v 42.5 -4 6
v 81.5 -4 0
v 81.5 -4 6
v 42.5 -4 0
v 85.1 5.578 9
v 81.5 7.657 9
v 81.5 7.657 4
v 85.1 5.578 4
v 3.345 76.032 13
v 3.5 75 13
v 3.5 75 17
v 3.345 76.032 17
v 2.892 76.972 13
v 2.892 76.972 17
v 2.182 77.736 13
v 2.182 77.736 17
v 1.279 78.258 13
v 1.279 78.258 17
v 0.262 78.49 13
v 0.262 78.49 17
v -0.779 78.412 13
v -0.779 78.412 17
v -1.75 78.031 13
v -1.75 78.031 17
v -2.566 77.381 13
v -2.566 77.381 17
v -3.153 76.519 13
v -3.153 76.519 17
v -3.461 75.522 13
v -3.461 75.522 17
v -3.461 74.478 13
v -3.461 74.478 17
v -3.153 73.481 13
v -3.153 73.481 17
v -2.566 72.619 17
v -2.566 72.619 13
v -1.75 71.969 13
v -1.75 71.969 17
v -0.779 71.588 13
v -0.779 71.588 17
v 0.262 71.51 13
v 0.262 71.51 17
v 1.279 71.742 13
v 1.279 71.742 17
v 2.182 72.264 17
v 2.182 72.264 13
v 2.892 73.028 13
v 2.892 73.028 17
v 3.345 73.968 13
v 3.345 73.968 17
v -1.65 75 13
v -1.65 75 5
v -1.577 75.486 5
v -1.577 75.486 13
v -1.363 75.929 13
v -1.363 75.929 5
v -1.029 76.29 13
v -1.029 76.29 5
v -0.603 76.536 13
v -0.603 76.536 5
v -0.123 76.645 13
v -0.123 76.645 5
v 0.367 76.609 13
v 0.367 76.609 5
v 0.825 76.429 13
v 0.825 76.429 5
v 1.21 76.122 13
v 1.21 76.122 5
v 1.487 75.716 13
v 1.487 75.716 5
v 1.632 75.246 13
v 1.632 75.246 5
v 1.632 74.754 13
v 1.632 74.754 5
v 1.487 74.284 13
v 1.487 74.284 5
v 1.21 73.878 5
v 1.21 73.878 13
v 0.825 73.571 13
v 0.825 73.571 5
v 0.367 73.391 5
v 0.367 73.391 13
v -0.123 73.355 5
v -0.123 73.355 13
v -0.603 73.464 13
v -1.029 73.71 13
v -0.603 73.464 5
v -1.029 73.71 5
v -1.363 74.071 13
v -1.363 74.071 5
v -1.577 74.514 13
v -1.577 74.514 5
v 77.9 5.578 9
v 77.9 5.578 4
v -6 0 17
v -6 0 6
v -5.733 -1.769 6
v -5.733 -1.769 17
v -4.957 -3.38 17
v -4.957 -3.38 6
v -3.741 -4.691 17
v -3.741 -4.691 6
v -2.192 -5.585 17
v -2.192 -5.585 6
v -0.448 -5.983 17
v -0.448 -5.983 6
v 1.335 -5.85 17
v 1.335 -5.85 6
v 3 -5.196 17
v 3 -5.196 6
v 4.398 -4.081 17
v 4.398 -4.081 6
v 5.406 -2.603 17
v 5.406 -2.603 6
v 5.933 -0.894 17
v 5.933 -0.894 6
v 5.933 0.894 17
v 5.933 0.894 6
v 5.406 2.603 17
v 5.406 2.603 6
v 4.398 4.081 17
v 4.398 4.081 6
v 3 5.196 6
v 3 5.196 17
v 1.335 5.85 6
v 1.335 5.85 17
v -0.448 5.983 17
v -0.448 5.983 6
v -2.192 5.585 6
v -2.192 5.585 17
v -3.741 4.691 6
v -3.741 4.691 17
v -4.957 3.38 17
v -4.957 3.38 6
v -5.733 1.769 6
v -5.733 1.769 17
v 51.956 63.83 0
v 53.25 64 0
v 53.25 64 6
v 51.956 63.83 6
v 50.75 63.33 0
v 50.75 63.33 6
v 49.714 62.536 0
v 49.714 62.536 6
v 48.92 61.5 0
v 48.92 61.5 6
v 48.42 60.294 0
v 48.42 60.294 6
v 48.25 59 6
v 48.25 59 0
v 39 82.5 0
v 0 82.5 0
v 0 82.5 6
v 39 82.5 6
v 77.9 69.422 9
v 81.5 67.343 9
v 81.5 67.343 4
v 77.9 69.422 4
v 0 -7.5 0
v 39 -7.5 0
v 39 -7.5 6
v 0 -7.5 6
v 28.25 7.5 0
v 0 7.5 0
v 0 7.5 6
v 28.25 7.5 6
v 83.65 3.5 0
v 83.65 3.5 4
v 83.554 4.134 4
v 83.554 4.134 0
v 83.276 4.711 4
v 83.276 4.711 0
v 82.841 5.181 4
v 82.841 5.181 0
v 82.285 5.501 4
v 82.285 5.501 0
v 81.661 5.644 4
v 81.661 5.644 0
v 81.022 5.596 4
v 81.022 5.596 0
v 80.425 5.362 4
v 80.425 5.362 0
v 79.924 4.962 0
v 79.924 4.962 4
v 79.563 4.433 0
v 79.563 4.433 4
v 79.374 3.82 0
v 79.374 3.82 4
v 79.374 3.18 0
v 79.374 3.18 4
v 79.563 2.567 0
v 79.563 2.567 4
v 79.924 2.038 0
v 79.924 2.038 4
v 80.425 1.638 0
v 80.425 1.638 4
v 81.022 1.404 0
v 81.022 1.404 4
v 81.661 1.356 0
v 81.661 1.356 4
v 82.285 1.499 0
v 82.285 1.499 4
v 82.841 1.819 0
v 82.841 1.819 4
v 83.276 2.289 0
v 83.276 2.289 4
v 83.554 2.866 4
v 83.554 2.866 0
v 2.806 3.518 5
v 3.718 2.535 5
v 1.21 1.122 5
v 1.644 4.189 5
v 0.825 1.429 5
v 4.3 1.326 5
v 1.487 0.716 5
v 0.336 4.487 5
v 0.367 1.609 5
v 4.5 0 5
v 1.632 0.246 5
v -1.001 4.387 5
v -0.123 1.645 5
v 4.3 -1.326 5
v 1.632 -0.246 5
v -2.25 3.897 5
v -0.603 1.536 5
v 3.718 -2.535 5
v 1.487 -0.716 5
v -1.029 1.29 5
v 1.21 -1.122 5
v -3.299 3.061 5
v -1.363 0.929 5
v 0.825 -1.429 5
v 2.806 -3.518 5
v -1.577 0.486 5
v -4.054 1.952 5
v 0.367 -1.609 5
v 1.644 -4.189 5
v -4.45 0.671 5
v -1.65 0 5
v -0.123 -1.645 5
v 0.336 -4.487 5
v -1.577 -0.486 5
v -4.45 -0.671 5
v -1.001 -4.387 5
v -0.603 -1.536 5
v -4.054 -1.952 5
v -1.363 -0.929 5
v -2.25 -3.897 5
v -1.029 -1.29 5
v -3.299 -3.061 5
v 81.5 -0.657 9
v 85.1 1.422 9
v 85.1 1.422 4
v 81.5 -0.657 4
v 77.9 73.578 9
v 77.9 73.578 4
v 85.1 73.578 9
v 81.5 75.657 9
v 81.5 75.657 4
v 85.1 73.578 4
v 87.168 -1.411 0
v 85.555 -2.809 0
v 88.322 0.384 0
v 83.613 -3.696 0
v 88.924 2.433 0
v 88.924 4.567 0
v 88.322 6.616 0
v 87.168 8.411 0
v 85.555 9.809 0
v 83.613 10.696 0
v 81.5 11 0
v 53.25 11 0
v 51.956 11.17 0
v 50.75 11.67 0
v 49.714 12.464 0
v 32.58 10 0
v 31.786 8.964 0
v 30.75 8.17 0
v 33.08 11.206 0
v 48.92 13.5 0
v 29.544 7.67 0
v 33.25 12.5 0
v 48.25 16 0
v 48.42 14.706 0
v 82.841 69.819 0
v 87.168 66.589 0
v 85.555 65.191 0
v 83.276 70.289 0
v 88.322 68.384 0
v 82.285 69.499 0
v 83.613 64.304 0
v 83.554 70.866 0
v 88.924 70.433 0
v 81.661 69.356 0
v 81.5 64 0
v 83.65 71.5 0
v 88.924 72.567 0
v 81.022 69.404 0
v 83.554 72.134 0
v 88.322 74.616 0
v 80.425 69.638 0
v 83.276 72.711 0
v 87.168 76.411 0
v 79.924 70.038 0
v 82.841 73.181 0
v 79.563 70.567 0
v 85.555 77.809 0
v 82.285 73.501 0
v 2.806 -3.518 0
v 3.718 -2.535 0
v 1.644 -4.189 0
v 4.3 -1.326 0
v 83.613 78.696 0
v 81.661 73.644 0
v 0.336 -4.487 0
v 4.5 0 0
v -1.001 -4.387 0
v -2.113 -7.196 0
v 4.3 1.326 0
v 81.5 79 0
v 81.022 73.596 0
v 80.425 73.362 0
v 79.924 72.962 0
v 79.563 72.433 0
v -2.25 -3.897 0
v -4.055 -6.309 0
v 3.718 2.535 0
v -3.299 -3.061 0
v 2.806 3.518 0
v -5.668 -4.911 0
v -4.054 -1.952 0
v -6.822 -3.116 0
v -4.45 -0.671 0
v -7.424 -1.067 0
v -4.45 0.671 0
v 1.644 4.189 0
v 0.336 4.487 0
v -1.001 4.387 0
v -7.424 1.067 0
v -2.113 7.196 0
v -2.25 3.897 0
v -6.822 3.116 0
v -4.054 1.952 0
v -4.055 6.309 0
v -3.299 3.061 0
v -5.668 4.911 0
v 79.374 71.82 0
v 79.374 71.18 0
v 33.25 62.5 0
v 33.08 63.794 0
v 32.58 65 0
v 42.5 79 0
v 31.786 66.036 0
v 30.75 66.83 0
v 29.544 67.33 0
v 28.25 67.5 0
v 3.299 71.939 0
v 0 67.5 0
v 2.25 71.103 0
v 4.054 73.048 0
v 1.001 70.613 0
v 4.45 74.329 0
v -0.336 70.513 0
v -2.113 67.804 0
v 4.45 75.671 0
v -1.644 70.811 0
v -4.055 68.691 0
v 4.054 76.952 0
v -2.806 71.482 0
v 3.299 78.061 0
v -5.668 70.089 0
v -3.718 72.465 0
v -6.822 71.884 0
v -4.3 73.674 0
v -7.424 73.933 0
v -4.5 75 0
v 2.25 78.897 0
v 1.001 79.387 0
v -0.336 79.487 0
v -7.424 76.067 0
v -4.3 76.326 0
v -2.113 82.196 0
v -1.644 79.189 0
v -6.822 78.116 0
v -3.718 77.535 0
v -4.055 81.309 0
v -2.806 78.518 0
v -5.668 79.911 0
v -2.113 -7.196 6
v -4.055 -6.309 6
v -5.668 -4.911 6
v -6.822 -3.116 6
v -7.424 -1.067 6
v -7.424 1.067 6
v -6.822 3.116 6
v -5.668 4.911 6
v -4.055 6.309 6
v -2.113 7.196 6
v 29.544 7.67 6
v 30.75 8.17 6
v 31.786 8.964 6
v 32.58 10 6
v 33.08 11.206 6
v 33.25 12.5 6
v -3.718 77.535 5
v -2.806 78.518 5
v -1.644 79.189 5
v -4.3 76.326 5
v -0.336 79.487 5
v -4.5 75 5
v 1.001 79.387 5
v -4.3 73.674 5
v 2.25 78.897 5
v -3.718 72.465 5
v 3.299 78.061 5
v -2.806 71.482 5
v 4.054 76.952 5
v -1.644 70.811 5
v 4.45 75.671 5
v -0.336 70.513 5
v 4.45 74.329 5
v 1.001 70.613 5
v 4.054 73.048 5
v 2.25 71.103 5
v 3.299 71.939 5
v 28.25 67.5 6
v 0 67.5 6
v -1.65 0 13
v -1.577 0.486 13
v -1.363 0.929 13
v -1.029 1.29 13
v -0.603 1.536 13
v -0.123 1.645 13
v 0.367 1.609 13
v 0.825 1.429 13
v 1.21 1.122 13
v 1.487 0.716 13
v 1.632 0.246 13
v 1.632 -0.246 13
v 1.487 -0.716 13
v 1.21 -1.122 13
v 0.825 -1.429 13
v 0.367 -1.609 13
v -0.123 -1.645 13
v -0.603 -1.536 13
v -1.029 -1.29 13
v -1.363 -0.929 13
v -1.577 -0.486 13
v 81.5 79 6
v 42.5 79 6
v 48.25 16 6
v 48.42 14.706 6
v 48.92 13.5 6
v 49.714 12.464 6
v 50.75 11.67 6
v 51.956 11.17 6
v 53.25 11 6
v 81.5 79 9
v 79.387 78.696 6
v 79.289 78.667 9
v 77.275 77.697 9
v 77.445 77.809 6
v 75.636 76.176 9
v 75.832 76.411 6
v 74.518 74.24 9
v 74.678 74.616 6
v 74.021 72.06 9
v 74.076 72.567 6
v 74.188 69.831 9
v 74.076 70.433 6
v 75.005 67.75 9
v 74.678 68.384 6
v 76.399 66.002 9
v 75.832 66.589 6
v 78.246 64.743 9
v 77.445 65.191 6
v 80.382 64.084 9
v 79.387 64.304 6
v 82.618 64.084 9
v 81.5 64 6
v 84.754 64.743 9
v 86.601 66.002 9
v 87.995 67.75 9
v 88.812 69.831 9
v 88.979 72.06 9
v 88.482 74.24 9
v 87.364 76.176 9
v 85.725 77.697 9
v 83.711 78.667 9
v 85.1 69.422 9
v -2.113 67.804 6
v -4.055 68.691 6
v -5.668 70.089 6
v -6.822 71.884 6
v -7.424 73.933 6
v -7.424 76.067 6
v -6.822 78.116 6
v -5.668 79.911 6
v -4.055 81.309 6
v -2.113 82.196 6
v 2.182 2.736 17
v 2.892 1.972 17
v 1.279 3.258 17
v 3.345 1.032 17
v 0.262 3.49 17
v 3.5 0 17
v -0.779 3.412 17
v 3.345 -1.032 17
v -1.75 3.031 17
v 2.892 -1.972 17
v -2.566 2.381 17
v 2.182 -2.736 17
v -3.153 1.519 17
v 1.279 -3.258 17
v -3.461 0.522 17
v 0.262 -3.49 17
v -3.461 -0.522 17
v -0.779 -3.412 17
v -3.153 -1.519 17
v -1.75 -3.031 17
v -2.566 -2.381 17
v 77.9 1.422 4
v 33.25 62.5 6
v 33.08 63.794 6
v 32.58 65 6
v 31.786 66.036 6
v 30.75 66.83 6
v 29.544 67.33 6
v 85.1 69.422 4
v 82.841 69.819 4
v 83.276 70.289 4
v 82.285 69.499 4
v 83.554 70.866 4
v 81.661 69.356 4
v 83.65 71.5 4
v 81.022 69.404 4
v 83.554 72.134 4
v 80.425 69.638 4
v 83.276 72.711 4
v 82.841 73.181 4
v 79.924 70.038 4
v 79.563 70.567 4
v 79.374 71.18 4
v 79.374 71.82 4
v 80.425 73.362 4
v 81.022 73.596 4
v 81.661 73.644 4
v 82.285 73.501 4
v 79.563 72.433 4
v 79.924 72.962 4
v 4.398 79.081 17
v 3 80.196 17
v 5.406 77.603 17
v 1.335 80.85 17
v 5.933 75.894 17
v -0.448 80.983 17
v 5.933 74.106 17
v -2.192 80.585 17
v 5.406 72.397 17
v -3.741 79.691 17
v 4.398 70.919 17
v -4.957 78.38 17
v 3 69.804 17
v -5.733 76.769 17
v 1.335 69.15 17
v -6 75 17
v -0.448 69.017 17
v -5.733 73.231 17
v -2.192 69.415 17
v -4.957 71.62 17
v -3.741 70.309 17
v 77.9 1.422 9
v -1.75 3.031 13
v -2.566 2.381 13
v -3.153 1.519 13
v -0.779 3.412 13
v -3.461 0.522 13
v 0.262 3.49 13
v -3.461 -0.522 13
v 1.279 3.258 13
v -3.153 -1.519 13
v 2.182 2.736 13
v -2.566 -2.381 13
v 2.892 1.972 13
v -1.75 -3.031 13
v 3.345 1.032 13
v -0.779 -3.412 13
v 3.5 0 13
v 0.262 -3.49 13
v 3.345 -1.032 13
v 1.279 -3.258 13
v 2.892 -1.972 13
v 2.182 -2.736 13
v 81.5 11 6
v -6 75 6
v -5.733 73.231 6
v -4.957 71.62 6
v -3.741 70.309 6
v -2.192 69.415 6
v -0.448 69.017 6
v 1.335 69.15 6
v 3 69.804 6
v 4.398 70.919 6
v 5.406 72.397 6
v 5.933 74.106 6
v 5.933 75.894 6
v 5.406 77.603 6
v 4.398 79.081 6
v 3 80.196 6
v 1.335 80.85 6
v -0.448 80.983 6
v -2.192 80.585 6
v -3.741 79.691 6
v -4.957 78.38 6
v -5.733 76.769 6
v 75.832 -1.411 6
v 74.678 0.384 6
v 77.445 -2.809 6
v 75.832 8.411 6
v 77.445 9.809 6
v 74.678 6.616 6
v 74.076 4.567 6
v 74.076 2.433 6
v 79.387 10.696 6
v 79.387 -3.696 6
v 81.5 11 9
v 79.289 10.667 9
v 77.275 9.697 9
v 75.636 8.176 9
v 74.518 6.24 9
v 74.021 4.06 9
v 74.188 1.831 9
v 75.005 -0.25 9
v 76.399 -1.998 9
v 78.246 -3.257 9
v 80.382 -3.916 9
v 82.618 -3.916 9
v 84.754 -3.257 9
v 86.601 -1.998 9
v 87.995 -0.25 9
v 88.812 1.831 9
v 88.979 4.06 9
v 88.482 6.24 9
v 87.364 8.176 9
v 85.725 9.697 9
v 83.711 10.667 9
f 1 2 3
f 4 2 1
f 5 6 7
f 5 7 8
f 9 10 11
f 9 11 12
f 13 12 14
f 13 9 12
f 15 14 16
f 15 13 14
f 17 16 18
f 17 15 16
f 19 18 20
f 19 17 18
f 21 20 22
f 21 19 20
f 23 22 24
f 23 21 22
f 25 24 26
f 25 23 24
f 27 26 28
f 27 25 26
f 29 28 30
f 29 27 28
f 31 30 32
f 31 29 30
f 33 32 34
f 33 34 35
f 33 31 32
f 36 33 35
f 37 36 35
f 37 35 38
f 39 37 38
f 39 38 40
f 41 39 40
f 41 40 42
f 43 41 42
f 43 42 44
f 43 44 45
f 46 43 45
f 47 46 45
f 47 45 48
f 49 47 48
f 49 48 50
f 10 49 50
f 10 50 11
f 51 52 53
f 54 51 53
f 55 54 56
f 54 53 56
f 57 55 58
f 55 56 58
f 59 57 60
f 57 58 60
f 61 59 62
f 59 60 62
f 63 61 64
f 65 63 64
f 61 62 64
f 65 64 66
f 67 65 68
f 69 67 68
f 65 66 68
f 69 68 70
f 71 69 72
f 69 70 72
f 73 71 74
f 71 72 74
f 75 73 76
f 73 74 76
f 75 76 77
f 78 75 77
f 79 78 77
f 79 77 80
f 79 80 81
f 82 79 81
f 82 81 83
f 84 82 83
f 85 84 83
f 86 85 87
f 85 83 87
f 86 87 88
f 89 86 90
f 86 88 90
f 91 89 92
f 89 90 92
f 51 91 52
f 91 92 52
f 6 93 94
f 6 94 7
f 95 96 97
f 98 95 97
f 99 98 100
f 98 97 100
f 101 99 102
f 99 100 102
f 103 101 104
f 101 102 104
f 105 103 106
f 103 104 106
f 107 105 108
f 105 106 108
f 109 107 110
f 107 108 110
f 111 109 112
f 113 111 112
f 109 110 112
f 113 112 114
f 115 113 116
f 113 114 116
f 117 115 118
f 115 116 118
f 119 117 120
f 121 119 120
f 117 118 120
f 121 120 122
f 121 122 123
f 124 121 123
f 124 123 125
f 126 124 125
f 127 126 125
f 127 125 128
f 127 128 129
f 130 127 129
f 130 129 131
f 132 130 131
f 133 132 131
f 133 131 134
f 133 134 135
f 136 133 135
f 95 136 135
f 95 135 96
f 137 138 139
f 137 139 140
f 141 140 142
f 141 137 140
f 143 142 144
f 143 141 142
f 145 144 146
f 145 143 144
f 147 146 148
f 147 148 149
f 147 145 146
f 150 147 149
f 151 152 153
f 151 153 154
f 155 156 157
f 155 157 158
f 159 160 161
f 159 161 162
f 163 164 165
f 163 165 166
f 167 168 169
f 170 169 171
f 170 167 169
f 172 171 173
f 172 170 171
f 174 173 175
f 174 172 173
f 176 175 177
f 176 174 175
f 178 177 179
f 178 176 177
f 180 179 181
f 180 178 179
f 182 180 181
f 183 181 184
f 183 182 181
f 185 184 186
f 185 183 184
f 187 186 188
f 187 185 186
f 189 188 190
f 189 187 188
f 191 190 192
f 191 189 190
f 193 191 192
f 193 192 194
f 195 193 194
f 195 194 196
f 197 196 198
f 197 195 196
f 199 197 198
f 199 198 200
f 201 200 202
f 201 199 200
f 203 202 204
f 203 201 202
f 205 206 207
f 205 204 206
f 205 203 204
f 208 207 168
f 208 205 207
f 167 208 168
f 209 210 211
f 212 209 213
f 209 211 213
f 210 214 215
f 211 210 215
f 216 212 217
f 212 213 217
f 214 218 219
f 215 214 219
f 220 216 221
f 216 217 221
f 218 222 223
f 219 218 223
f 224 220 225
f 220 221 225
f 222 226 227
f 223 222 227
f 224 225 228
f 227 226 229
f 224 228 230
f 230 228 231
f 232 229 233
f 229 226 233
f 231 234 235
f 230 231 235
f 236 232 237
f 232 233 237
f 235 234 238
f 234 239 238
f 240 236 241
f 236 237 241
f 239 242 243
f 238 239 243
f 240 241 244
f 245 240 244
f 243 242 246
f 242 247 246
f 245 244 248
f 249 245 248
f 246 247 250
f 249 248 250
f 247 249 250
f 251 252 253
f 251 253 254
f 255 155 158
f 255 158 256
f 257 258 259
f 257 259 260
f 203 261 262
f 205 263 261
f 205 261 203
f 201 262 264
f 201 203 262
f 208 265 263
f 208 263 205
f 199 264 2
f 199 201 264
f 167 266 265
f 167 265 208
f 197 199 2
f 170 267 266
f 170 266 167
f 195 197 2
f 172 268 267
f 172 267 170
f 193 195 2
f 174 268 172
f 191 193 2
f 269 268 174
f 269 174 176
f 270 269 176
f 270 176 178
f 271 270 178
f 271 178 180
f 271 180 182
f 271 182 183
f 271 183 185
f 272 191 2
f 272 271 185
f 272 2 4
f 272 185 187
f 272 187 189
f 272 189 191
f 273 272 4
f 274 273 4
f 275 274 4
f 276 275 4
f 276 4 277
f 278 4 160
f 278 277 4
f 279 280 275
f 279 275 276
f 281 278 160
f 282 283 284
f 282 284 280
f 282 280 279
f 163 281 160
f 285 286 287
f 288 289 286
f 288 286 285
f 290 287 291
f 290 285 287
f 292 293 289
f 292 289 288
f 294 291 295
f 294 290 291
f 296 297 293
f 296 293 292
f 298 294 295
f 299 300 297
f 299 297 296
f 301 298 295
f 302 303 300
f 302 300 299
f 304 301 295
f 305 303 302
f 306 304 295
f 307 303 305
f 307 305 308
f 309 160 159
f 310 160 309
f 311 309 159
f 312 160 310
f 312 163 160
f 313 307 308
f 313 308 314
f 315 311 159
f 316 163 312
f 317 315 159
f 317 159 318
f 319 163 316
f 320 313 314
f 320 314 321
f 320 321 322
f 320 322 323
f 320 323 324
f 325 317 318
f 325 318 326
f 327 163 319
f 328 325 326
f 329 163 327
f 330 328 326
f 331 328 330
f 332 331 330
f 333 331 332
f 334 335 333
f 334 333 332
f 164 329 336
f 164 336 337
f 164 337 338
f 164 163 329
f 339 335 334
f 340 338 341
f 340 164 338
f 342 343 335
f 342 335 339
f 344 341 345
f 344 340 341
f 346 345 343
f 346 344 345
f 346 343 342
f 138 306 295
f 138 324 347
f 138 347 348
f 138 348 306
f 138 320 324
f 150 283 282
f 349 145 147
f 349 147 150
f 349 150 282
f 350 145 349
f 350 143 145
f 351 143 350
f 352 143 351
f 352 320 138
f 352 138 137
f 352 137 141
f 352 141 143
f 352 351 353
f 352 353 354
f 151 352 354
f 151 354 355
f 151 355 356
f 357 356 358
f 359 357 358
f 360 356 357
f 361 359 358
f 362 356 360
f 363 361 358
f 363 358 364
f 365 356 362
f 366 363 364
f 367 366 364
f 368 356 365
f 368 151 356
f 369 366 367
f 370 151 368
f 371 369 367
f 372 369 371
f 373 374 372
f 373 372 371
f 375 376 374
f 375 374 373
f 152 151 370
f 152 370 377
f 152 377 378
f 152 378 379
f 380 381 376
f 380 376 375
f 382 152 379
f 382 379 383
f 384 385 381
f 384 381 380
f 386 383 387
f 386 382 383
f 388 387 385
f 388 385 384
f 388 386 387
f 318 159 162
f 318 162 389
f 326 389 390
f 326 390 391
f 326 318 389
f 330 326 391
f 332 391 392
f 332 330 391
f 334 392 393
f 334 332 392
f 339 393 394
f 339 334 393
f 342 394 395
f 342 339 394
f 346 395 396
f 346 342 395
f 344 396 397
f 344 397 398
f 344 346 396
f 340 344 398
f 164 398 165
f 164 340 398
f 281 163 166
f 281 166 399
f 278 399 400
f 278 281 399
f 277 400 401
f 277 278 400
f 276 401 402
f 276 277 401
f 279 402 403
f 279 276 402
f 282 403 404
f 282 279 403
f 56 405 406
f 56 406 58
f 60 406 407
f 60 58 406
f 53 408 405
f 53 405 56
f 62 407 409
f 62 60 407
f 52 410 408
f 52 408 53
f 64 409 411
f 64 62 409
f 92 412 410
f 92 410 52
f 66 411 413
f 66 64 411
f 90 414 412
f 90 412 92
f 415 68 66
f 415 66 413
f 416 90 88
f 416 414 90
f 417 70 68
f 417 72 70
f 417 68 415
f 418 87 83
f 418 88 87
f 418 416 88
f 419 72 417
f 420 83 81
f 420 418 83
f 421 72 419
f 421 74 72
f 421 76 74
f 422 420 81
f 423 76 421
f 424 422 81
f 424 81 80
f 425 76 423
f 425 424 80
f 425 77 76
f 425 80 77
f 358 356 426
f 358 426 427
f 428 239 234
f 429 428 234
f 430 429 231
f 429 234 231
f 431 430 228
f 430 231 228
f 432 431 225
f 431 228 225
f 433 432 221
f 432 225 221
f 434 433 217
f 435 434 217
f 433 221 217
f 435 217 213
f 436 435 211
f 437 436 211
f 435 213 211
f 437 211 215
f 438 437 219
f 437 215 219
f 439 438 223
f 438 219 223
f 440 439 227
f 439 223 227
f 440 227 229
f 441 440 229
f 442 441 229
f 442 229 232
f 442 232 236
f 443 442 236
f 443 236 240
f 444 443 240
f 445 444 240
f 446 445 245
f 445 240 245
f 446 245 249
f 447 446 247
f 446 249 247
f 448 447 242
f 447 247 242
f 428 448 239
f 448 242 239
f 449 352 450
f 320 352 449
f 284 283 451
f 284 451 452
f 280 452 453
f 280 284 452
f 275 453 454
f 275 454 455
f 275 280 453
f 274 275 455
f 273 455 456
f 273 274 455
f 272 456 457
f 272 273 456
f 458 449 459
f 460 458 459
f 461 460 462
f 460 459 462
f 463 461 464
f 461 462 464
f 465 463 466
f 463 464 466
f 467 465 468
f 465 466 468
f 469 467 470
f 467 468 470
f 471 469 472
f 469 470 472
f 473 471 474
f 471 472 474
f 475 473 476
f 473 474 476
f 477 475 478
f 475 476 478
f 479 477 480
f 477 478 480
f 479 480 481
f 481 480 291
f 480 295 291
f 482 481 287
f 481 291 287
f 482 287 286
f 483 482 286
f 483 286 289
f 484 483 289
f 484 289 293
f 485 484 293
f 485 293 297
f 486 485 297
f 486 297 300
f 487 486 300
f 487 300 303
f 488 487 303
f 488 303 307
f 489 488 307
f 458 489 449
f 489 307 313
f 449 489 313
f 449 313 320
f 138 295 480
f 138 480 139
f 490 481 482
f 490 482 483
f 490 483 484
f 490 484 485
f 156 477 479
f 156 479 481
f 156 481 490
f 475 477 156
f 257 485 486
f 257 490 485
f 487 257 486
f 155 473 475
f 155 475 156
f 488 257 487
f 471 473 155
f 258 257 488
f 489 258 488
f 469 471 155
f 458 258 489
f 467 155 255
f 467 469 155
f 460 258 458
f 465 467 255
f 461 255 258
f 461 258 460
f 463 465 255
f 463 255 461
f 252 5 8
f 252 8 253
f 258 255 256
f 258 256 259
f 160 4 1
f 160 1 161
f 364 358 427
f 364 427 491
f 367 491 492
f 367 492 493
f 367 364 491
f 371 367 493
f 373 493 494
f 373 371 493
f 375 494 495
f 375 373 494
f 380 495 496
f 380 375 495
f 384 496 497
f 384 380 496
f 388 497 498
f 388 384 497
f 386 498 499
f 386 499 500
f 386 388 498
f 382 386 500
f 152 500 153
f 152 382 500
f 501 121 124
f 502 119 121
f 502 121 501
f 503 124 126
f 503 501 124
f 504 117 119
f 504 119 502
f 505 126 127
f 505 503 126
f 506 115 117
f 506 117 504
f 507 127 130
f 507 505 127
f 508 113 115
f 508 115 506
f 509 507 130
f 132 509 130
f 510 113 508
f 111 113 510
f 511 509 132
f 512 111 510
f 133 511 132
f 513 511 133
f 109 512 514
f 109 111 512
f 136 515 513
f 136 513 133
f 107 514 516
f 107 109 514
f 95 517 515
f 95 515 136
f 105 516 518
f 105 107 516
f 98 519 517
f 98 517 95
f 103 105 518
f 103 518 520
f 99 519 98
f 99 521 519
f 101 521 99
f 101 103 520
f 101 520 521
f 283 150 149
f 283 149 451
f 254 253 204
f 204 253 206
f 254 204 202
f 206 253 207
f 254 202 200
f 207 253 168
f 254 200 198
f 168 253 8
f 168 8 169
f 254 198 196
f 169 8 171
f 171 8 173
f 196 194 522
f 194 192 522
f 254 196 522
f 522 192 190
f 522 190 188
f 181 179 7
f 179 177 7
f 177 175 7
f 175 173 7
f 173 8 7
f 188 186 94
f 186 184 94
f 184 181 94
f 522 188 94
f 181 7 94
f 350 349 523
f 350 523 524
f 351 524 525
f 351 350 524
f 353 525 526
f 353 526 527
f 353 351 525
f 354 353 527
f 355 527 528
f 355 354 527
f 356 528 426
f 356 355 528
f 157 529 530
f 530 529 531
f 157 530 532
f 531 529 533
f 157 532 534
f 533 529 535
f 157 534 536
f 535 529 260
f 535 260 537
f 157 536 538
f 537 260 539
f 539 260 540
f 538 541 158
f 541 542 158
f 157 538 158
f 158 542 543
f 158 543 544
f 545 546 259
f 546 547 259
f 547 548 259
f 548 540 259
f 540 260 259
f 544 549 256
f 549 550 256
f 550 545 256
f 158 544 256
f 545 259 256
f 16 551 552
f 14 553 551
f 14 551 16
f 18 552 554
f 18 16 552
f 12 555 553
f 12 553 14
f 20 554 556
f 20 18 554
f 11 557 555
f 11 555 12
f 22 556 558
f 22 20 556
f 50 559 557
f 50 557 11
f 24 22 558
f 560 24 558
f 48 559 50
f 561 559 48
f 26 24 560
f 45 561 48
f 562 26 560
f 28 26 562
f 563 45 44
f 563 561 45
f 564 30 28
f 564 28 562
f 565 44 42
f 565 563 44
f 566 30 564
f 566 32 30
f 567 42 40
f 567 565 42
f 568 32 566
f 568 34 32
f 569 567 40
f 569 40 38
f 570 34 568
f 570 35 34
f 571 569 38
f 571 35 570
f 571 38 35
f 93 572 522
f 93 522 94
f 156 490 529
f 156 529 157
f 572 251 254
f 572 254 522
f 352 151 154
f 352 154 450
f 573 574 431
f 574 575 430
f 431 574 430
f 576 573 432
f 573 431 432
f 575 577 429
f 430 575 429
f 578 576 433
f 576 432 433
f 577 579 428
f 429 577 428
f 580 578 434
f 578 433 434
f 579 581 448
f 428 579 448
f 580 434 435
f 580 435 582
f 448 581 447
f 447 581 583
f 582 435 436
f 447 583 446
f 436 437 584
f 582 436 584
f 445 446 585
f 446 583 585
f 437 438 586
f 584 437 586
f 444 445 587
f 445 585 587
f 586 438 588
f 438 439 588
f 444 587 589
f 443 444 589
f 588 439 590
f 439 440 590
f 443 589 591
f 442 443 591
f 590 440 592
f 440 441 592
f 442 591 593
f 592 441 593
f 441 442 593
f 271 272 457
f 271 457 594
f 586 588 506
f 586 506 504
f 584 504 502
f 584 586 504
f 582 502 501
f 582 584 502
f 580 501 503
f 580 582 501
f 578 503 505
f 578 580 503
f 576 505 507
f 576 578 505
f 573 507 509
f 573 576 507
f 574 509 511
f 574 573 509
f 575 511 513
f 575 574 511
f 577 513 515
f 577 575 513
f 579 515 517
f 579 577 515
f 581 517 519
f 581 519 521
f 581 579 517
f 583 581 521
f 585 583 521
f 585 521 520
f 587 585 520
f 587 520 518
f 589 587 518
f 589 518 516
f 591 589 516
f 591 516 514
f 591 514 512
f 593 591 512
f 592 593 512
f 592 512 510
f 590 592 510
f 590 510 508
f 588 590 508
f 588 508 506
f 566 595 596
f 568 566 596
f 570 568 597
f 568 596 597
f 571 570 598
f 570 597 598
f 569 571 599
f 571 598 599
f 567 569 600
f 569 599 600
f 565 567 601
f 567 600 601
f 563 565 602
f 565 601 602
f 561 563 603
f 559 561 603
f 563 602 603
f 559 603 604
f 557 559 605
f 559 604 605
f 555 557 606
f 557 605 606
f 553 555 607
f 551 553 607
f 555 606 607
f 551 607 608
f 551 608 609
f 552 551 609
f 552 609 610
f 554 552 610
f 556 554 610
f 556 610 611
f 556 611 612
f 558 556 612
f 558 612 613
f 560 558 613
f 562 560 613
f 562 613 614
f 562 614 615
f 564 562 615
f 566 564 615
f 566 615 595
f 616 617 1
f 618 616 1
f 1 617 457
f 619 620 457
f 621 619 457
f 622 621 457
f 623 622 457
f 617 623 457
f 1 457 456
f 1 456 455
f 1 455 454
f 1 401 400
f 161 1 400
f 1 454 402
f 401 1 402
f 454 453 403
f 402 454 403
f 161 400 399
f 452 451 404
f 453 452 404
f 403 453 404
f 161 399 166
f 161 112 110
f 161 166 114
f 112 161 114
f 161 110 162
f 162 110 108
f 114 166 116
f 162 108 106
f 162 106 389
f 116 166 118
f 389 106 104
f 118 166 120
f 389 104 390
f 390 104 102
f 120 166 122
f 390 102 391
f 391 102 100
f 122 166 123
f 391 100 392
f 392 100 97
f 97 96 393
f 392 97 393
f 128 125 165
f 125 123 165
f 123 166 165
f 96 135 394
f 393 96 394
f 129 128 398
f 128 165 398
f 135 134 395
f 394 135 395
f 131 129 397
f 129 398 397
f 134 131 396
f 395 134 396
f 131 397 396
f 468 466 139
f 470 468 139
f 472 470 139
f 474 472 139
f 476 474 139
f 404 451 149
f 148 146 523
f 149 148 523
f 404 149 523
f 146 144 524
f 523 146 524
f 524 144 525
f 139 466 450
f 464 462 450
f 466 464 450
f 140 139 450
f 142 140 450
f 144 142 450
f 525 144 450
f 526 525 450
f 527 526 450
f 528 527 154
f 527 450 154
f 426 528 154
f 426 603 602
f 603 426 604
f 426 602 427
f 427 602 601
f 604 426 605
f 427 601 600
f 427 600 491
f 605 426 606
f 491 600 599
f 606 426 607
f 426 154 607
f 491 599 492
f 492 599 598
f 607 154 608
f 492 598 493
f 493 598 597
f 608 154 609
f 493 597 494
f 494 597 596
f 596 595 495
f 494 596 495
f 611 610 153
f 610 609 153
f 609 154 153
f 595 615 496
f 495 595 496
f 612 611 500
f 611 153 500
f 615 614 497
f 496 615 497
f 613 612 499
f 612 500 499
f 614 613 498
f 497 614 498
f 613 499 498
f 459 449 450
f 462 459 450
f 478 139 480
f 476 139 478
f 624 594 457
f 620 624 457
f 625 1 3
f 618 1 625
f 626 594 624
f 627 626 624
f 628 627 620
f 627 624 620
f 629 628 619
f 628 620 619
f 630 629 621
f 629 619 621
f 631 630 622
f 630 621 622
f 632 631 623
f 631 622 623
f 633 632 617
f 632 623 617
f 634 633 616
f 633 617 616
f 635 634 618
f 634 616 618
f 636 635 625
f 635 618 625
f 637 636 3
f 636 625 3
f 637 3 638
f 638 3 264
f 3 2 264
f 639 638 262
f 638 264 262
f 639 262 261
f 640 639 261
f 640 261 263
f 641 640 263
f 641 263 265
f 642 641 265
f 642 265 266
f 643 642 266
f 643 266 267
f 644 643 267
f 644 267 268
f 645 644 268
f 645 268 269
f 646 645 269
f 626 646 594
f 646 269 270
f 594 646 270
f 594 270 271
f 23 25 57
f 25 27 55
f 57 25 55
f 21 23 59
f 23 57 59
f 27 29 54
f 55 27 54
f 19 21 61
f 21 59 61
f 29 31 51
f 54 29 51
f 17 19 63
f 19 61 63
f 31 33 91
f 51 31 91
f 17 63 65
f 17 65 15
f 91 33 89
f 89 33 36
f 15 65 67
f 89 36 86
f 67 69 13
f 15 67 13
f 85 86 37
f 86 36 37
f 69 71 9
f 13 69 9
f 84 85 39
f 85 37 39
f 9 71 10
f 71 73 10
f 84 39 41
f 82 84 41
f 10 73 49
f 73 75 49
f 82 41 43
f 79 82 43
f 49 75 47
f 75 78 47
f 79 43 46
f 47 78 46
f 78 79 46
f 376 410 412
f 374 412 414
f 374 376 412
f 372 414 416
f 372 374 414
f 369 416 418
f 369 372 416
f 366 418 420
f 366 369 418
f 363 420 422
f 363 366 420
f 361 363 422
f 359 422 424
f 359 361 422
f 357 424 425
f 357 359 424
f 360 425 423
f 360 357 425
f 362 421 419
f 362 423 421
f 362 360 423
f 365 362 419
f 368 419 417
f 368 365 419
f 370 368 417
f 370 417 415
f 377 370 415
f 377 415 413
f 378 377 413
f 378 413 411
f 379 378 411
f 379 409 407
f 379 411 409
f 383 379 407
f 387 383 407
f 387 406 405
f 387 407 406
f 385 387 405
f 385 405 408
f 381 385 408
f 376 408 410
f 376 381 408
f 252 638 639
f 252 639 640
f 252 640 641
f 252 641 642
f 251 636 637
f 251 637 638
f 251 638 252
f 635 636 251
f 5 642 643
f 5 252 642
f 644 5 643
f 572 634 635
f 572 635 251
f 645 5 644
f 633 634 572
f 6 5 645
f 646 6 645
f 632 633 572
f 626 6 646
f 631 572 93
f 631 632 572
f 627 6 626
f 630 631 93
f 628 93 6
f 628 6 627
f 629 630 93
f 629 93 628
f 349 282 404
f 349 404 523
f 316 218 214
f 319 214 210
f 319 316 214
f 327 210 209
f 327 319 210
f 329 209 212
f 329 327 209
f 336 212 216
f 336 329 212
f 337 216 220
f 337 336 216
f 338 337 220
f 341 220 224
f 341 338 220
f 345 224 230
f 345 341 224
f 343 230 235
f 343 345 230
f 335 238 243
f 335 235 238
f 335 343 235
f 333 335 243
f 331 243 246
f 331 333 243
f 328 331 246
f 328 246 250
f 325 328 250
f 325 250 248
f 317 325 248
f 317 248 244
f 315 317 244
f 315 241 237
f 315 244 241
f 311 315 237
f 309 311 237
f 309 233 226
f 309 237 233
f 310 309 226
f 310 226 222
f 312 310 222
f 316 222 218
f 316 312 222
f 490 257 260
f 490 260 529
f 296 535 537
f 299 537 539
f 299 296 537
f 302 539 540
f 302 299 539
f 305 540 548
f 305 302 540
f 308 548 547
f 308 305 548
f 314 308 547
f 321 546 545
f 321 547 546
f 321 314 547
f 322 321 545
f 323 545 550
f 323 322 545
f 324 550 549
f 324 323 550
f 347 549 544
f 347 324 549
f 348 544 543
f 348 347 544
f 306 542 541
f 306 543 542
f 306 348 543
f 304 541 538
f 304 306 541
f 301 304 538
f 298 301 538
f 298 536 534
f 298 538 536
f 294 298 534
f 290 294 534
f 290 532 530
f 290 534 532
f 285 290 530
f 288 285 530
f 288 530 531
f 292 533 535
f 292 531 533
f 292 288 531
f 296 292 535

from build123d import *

# Parameters (mm, degrees)
SKETCH1_R           = 4.5
SKETCH1_R_2         = 2.15
BOSS_EXTRUDE1_DEPTH = 6
BOSS_EXTRUDE2_START = -1
SKETCH2_R           = 6
SKETCH2_R_2         = 3.5
BOSS_EXTRUDE2_DEPTH = 12
BOSS_EXTRUDE3_START = -5
SKETCH3_R           = 3.5
SKETCH3_R_2         = 1.65
BOSS_EXTRUDE3_DEPTH = 8
SKETCH4_R           = 7.5
SKETCH4_R_2         = 2.15
BOSS_EXTRUDE4_DEPTH = 3
CUT_EXTRUDE1_DEPTH  = 5


with BuildPart() as part:
    # Sketch1 → Boss-Extrude1 (new body)
    with BuildSketch(Plane.XY):
        with BuildLine():
            Line((0, 82.5), (39, 82.5))
            Line((39, 82.5), (42.5, 79))
            Line((42.5, 79), (81.5, 79))
            ThreePointArc((81.5, 79), (89, 71.5), (81.5, 64))
            Line((81.5, 64), (53.25, 64))
            ThreePointArc((53.25, 64), (49.714466094, 62.535533906), (48.25, 59))
            Line((48.25, 59), (48.25, 16))
            ThreePointArc((48.25, 16), (49.714466094, 12.464466094), (53.25, 11))
            Line((53.25, 11), (81.5, 11))
            ThreePointArc((81.5, 11), (89, 3.5), (81.5, -4))
            Line((81.5, -4), (42.5, -4))
            Line((42.5, -4), (39, -7.5))
            Line((39, -7.5), (0, -7.5))
            ThreePointArc((0, -7.5), (-7.5, 0), (0, 7.5))
            Line((0, 7.5), (28.25, 7.5))
            ThreePointArc((28.25, 7.5), (31.785533906, 8.964466094), (33.25, 12.5))
            Line((33.25, 12.5), (33.25, 62.5))
            ThreePointArc((33.25, 62.5), (31.785533906, 66.035533906), (28.25, 67.5))
            Line((28.25, 67.5), (0, 67.5))
            ThreePointArc((0, 67.5), (-7.5, 75), (0, 82.5))
        make_face()
        Circle(SKETCH1_R, mode=Mode.SUBTRACT)
        with Locations(Location((0, 75, 0), (0, 0, 180))):
            Circle(SKETCH1_R, mode=Mode.SUBTRACT)
        with Locations((81.5, 71.5)):
            Circle(SKETCH1_R_2, mode=Mode.SUBTRACT)
        with Locations((81.5, 3.5)):
            Circle(SKETCH1_R_2, mode=Mode.SUBTRACT)
    extrude(amount=BOSS_EXTRUDE1_DEPTH)

    # Sketch2 → Boss-Extrude2 (add)
    # profile 1 of 2: a face of its own
    with BuildSketch(Plane.XY.offset(6).offset(BOSS_EXTRUDE2_START)):
        with Locations(Location((0, 75, 0), (0, 0, 180))):
            Circle(SKETCH2_R)
        with Locations((0, 75)):
            Circle(SKETCH2_R_2, mode=Mode.SUBTRACT)
    # profile 2 of 2: a face of its own
    with BuildSketch(Plane.XY.offset(6).offset(BOSS_EXTRUDE2_START)):
        with Locations(Location((0, 0, 0), (0, 0, 180))):
            Circle(SKETCH2_R)
        Circle(SKETCH2_R_2, mode=Mode.SUBTRACT)
    extrude(amount=BOSS_EXTRUDE2_DEPTH)

    # Sketch3 → Boss-Extrude3 (add)
    # profile 1 of 2: a face of its own
    with BuildSketch(Plane(origin=(0, 0, 0), x_dir=(-1, 0, 0), z_dir=(0, 0, -1)).offset(BOSS_EXTRUDE3_START)):
        with Locations(Location((0, 75, 0), (0, 0, 180))):
            Circle(SKETCH3_R)
        with Locations((0, 75)):
            Circle(SKETCH3_R_2, mode=Mode.SUBTRACT)
    # profile 2 of 2: a face of its own
    with BuildSketch(Plane(origin=(0, 0, 0), x_dir=(-1, 0, 0), z_dir=(0, 0, -1)).offset(BOSS_EXTRUDE3_START)):
        with Locations(Location((0, 0, 0), (0, 0, 180))):
            Circle(SKETCH3_R)
        Circle(SKETCH3_R_2, mode=Mode.SUBTRACT)
    extrude(amount=-BOSS_EXTRUDE3_DEPTH)

    # Sketch4 → Boss-Extrude4 (add)
    # profile 1 of 2: a face of its own
    with BuildSketch(Plane.XY.offset(6)):
        with Locations(Location((81.5, 3.5, 0), (0, 0, 90))):
            Circle(SKETCH4_R)
        with Locations((81.5, 3.5)):
            Circle(SKETCH4_R_2, mode=Mode.SUBTRACT)
    # profile 2 of 2: a face of its own
    with BuildSketch(Plane.XY.offset(6)):
        with Locations(Location((81.5, 71.5, 0), (0, 0, 90))):
            Circle(SKETCH4_R)
        with Locations((81.5, 71.5)):
            Circle(SKETCH4_R_2, mode=Mode.SUBTRACT)
    extrude(amount=BOSS_EXTRUDE4_DEPTH)

    # Sketch5 → Cut-Extrude1 (cut)
    with BuildSketch(Plane.XY.offset(9)):
        Polygon((77.9, 5.578460969), (81.5, 7.656921938), (85.1, 5.578460969), (85.1, 1.421539031), (81.5, -0.656921938), (77.9, 1.421539031), align=None)
        Polygon((77.9, 73.578460969), (81.5, 75.656921938), (85.1, 73.578460969), (85.1, 69.421539031), (81.5, 67.343078062), (77.9, 69.421539031), align=None)
    extrude(amount=-CUT_EXTRUDE1_DEPTH, mode=Mode.SUBTRACT)


solid = part.part
